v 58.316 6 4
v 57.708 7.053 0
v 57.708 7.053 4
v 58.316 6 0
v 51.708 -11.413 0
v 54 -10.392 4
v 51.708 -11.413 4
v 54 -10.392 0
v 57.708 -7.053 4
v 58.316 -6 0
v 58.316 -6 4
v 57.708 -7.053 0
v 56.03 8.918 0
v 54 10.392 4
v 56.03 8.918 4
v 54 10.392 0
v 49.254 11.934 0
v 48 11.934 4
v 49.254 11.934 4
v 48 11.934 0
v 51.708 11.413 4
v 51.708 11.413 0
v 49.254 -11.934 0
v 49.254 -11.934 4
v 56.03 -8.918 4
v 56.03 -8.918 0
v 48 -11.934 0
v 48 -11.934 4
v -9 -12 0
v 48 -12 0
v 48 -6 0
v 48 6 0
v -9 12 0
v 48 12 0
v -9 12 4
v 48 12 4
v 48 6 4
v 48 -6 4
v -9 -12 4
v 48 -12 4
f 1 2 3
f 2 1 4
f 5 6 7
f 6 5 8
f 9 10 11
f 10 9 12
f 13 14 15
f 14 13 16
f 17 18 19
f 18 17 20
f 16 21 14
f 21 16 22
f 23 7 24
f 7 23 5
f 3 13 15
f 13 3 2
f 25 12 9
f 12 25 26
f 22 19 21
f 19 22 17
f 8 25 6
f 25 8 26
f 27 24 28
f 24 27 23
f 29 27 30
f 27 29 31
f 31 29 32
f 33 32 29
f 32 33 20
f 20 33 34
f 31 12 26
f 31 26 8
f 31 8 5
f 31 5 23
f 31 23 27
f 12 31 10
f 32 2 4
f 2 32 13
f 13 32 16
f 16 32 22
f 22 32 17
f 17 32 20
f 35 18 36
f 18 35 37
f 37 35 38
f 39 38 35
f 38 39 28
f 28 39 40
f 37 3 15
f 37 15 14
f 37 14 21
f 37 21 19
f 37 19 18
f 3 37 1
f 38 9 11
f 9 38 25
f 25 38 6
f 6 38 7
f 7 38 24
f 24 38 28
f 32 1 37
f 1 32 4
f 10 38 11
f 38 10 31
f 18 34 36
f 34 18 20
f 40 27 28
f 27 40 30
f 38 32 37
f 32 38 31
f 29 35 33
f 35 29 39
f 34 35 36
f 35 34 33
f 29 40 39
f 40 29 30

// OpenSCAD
//Size Of Wrench Opening
w=12;
//wrench thickness
t=4; //[1,2,3,4,5,6,8,10]


union(){
//wrench head
difference(){

        translate([4*w,0,0])cylinder(h=t,r=w);
    translate([3.75*w,-w/2,-t])cube([2*w,w,50*t]);
    
    }
//wrench body
    translate([-w*.75,-w,0])cube([w*4.75,2*w,t]);
}
